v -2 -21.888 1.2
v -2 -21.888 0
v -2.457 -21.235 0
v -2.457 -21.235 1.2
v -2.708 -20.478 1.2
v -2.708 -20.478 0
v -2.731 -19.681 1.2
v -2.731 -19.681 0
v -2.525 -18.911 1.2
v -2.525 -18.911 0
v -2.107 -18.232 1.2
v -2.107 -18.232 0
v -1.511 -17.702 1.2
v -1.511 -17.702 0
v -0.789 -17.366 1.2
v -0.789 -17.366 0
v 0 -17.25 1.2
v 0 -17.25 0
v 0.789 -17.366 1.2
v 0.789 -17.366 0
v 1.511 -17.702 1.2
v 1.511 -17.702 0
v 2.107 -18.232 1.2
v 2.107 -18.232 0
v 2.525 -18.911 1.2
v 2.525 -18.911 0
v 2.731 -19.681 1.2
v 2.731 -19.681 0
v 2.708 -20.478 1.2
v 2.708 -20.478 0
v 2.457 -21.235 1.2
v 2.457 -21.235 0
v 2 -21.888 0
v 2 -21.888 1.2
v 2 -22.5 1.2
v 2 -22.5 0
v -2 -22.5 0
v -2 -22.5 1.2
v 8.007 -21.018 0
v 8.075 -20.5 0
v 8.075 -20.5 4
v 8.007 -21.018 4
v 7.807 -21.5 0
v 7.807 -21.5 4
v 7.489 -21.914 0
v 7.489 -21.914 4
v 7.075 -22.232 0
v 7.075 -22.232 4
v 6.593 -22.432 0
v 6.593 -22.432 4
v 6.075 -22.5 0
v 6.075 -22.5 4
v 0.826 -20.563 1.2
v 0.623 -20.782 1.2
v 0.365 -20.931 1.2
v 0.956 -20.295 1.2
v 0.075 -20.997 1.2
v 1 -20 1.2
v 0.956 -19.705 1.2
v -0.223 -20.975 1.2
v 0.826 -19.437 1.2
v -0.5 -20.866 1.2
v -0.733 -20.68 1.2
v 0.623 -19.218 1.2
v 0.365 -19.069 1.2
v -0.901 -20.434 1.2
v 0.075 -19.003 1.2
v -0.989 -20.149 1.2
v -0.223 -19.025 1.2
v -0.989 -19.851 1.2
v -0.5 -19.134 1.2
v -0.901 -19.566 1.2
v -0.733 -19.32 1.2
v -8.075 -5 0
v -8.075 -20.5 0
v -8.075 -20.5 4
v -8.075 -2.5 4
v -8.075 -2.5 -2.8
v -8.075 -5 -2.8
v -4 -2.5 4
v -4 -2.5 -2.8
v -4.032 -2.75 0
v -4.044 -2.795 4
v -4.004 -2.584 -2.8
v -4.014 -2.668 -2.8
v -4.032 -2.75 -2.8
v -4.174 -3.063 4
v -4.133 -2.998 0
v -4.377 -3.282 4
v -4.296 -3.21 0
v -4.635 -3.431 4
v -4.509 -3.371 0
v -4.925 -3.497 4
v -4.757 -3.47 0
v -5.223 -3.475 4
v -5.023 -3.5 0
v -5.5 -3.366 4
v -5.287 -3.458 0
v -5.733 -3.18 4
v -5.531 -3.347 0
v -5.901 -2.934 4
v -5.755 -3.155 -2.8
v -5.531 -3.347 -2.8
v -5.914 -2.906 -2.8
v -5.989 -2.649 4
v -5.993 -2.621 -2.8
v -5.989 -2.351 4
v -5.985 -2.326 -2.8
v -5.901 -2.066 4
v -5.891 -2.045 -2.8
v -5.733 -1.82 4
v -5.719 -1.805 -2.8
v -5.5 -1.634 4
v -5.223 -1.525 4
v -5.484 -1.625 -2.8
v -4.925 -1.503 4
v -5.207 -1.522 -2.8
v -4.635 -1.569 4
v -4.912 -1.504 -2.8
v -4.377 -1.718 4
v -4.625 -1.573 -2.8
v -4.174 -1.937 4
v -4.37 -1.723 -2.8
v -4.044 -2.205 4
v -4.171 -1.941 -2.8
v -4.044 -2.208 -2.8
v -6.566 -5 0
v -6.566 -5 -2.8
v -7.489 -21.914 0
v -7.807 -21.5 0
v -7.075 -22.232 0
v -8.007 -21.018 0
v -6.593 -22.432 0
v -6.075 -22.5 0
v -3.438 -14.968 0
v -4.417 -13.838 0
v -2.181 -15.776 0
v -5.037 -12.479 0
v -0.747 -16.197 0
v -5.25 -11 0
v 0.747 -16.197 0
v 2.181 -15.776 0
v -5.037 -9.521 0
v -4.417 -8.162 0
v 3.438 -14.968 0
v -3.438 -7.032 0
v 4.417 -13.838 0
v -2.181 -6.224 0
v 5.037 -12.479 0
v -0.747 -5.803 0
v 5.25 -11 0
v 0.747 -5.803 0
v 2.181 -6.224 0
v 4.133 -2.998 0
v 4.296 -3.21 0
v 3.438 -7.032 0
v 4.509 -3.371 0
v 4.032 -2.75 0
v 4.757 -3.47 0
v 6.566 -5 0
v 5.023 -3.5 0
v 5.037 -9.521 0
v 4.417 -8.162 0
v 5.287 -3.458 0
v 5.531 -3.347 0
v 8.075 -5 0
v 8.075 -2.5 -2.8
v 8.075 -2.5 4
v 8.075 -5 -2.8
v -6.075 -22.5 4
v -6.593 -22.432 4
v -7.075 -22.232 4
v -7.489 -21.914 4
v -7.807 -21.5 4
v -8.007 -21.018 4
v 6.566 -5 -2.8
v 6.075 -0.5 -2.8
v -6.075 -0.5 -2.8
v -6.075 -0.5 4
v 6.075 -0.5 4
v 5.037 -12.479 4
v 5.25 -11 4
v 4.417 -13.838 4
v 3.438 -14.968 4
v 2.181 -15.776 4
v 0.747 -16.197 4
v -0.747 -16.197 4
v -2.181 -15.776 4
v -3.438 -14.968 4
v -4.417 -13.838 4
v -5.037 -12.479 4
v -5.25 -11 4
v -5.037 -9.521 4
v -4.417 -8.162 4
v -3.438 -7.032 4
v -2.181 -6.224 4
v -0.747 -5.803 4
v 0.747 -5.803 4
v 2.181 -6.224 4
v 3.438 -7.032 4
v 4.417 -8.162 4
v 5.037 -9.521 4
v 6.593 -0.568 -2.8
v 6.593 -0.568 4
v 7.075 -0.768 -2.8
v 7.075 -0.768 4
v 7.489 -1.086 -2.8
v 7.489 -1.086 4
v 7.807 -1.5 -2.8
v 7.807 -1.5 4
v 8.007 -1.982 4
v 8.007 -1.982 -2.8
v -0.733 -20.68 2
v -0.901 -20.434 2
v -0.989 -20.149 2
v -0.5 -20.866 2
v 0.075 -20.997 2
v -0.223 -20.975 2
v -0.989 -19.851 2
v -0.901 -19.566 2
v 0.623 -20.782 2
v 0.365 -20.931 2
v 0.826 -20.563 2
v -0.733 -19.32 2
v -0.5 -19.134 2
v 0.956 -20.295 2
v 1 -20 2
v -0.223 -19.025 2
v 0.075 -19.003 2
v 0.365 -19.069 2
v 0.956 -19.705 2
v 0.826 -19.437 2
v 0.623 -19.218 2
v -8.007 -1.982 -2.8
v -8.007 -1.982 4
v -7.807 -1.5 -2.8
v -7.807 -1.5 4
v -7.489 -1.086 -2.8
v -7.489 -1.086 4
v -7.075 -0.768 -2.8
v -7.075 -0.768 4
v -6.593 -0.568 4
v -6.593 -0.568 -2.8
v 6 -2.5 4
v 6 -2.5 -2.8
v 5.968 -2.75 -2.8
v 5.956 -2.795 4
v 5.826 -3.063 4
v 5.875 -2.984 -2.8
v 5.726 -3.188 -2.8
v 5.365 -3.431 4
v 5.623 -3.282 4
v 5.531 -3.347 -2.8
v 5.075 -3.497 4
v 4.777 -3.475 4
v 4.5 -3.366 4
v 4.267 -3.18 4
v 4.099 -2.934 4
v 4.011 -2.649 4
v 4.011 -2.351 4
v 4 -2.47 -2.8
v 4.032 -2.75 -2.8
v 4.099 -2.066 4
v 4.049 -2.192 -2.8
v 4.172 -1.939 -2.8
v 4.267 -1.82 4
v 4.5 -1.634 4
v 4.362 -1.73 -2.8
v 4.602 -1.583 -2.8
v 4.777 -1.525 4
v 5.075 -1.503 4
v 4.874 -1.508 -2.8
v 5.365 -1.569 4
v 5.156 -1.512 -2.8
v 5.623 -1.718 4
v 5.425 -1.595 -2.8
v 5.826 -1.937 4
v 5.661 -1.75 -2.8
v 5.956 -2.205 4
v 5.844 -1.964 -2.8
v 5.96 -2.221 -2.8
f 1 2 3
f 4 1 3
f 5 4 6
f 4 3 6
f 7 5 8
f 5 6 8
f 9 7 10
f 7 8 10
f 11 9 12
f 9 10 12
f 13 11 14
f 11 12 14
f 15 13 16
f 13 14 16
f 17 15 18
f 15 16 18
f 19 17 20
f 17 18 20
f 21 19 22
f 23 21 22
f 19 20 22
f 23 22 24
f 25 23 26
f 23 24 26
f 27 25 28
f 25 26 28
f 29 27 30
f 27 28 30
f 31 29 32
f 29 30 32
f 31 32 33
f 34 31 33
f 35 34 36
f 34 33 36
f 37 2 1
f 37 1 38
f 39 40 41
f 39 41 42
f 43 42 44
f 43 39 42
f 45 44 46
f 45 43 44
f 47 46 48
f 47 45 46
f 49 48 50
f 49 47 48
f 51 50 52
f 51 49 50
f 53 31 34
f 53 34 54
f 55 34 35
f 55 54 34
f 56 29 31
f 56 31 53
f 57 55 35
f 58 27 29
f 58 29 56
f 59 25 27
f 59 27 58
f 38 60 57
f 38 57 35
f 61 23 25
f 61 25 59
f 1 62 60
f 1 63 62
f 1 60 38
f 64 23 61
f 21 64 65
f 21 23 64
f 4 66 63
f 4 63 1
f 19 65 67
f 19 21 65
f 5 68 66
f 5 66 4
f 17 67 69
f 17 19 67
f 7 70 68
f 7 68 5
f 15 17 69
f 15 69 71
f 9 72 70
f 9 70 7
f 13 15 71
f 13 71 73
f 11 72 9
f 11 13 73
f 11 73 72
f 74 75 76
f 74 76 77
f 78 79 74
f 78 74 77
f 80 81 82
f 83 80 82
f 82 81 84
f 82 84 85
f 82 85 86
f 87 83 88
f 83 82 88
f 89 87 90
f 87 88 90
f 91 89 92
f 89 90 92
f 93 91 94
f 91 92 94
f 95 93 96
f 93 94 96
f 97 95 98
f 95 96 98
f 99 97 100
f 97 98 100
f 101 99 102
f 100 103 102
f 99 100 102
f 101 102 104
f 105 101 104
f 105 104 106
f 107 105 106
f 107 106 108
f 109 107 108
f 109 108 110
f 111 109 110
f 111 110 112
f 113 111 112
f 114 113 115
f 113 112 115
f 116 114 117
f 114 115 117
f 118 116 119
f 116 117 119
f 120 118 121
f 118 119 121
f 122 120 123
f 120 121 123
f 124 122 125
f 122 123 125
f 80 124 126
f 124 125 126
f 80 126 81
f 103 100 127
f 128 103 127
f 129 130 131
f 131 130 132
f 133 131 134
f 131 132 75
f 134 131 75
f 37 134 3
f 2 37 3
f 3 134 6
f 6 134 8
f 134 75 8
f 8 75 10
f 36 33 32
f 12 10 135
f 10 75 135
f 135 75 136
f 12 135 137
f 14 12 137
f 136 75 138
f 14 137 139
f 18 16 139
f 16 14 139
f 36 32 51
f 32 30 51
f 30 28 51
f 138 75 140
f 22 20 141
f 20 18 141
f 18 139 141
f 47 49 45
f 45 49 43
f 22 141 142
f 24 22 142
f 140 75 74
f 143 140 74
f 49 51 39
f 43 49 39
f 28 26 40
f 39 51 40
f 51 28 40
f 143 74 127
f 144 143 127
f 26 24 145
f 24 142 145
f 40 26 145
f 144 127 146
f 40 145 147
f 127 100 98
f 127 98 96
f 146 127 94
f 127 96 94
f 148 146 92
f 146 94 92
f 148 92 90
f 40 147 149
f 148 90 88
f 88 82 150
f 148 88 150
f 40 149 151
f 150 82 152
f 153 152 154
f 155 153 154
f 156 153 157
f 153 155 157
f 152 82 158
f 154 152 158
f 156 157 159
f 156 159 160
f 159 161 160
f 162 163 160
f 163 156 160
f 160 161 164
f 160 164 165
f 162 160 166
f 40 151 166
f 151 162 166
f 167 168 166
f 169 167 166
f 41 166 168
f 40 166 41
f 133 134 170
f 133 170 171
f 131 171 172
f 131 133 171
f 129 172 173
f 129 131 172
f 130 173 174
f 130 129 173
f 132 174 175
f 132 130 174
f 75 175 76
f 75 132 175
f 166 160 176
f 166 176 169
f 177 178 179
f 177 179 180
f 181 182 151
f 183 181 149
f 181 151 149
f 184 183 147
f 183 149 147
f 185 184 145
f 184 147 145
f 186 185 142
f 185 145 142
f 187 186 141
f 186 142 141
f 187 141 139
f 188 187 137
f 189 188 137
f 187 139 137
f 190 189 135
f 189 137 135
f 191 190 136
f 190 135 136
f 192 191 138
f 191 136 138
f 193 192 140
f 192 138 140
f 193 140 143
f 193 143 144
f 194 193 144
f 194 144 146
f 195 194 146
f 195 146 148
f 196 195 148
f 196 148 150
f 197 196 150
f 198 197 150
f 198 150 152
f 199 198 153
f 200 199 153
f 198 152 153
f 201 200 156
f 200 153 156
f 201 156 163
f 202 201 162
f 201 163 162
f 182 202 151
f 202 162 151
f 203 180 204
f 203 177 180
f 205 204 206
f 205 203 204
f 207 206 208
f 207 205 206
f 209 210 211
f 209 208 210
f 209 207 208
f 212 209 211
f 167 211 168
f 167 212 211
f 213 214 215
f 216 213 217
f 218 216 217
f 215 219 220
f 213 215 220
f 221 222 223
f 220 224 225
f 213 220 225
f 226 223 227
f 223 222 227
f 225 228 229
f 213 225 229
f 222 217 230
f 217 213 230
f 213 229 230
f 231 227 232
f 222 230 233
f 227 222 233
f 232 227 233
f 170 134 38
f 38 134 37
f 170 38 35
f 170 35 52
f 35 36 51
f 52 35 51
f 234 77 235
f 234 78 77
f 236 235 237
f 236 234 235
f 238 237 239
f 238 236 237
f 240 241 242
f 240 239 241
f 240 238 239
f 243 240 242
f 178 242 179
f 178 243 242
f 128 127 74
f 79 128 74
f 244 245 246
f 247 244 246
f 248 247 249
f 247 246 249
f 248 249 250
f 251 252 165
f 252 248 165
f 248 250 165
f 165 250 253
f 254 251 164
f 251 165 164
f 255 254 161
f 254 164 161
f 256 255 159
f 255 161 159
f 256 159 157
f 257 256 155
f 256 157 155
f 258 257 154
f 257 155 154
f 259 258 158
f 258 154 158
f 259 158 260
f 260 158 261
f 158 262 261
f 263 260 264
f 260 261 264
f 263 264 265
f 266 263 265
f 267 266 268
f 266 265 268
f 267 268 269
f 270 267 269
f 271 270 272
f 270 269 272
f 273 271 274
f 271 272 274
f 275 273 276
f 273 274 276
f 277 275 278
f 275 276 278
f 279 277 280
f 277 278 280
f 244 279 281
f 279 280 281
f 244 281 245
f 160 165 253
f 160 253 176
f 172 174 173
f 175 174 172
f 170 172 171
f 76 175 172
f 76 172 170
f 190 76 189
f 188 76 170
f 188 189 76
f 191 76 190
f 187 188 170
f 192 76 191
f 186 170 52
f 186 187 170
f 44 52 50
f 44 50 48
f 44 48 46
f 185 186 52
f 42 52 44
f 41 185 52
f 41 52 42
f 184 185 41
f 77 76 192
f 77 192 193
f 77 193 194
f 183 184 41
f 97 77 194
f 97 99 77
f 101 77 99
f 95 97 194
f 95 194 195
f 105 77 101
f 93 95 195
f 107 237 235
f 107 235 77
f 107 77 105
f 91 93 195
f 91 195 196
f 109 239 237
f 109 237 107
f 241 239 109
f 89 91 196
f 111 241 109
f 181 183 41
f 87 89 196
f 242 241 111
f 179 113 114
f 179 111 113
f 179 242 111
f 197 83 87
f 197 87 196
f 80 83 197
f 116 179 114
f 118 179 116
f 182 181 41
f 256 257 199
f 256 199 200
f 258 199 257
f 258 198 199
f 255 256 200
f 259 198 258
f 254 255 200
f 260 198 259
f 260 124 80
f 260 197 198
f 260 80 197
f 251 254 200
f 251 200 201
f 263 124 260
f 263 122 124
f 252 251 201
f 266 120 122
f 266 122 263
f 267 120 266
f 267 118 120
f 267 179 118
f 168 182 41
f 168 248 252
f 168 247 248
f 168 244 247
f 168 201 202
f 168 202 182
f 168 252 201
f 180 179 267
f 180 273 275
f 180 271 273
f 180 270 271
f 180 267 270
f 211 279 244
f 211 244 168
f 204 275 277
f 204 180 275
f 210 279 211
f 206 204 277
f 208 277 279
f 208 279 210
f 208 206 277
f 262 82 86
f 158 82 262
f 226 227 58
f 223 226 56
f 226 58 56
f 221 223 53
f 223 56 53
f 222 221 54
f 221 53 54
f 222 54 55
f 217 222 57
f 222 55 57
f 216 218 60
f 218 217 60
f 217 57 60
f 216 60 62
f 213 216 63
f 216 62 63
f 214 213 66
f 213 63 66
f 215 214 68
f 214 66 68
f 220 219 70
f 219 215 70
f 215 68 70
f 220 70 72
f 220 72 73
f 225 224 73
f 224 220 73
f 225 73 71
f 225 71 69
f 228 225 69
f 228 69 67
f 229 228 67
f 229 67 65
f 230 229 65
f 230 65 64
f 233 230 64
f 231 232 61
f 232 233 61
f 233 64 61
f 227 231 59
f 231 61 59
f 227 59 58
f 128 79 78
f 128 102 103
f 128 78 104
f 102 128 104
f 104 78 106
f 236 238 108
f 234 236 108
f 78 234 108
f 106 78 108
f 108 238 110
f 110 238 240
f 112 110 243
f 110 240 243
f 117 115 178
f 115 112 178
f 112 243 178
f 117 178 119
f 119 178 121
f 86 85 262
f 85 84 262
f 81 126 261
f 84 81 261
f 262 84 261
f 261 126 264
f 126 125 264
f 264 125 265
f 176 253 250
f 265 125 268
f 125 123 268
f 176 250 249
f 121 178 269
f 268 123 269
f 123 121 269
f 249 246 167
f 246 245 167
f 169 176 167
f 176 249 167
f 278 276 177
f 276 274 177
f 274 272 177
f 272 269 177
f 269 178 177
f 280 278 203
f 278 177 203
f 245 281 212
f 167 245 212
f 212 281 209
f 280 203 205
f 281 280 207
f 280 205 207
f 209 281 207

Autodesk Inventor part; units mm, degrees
ref_plane "YZ Plane" through (0, 0, 0) normal (1, 0, 0) x (0, 1, 0)
ref_plane "XZ Plane" through (0, 0, 0) normal (0, 1, 0) x (-1, 0, 0)
sketch "sk_main" plane through (0, 0, 0) normal (0, 0, 1) x (1, 0, 0)
  arc A0 (-6.075, -0.5) -> (-8.075, -2.5) centre (-6.075, -2.5) ccw projected
  line L0 (-8.075, -20.5) -> (-8.075, -2.5) projected
  arc A1 (-8.075, -20.5) -> (-6.075, -22.5) centre (-6.075, -20.5) ccw projected
  line L1 (-6.075, -22.5) -> (6.075, -22.5) projected
  arc A2 (6.075, -22.5) -> (8.075, -20.5) centre (6.075, -20.5) ccw projected
  line L2 (8.075, -2.5) -> (8.075, -20.5) projected
  arc A3 (8.075, -2.5) -> (6.075, -0.5) centre (6.075, -2.5) ccw projected
  line L3 (-6.075, -0.5) -> (6.075, -0.5) projected
  circle A4 centre (-5, -2.5) radius 1 projected
  circle A5 centre (0, -20) radius 1 projected
  circle A6 centre (-5.075, -11) radius 1 projected
  circle A7 centre (5.075, -11) radius 1 projected
  circle A8 centre (5, -2.5) radius 1 projected
  circle A9 centre (0, -11) radius 3.4 projected
  circle A10 centre (0, -20) radius 2.75
  line L4 (-2, -21.8875) -> (-2, -22.5)
  line L5 (2, -21.8875) -> (2, -22.5)
  line L6 (0, 4.5828) -> (0, -27.4971) projected
  circle A11 centre (0, -11) radius 5.25
  arc A12 (-5.1545, -10.0032) -> (-5.1545, -11.9968) centre (-5.075, -11) ccw
  arc A13 (5.1545, -11.9968) -> (5.1545, -10.0032) centre (5.075, -11) ccw
  point P0 (0, 0)
  dimension "d1" = 5.5
  dimension "d2" = 4
  dimension "d3" = 10.5
extrude "ext_main" add sketch "sk_main" along normal blind 4 contours L3 L6 A11 A6 A10 L4 L1 A1 L0 A0 | L3 A3 L2 A2 L1 L5 A10 L6 A11 A7 | A7 A11 | A11 A6 | L4 A10 L1 | A10 L6 A5 L1 | L6 A5 A10 L1 | L1 A10 L5 picked at (5.5112, -11.1934) picked at (-5.5179, -11)
sketch "Sketch2" plane through (0, 0, 0) normal (0, 0, 1) x (1, 0, 0)
  line L0 (-6.075, -0.5) -> (6.075, -0.5) projected
  arc A0 (-6.075, -0.5) -> (-8.075, -2.5) centre (-6.075, -2.5) ccw projected
  line L1 (-8.075, -20.5) -> (-8.075, -2.5) projected
  arc A1 (8.075, -2.5) -> (6.075, -0.5) centre (6.075, -2.5) ccw projected
  line L2 (8.075, -2.5) -> (8.075, -20.5) projected
  circle A2 centre (5, -2.5) radius 1 projected
  circle A3 centre (-5, -2.5) radius 1 projected
  circle A4 centre (0, -11) radius 3.4 projected
  circle A5 centre (0, -11) radius 8.25
  line L3 (-4.0318, -2.75) -> (4.0318, -2.75)
  line L4 (-5.5309, -3.3474) -> (-8.075, -7.408)
  circle A6 centre (0, -11) radius 8.75 construction
  line L5 (5.5309, -3.3474) -> (8.075, -7.408)
  line L6 (0, 4.1) -> (0, -24.6) projected
  arc A7 (-4.0318, -2.75) -> (-5.5309, -3.3474) centre (-5, -2.5) ccw
  arc A8 (5.5309, -3.3474) -> (4.0318, -2.75) centre (5, -2.5) ccw
  line L7 (6.5663, -5) -> (8.075, -5)
  line L8 (-6.5663, -5) -> (-8.075, -5)
  point P0 (0, 0)
  dimension "d6" = 16.5
  dimension "d7" = 0.5
  dimension "d8" = 4.5
ref_plane "Work Plane1" through (-8.075, -22.5, -2.8) normal (0, 0, 1) x (1, 0, 0)
extrude "ext_base" add sketch "Sketch2" against normal up to surface (2.8 mm away) contours L0 L6 L3 A3 L4 L8 L1 A0 | L0 A1 L2 L7 L5 A2 L3 L6
sketch "Sketch4" plane through (0, 0, 0) normal (0, 0, -1) x (-1, 0, 0)
  line L0 (6.075, -22.5) -> (-6.075, -22.5) projected
  circle A0 centre (0, -20) radius 1 projected
  circle A1 centre (0, -20) radius 2.75
  line L1 (0, -27.4971) -> (0, 4.5828) projected
  line L2 (-2, -21.8875) -> (-2, -22.5)
  line L3 (2, -21.8875) -> (2, -22.5)
  point P0 (0, 0)
  dimension "d13" = 5.5
  dimension "d14" = 4
extrude "ext_cut_gearhousing" cut sketch "Sketch4" against normal blind 1.2 contours L0 A1 L3 | L0 L1 A0 A1 | L0 A1 L1 A0 | L0 L2 A1
sketch "Sketch3" plane through (0, 0, 4) normal (0, 0, 1) x (1, 0, 0)
  circle A0 centre (0, -20) radius 1 projected
  point P0 (0, 0)
extrude "ext_dowelfill" add sketch "Sketch3" against normal blind 2
properties part number "linact_palm_front"
